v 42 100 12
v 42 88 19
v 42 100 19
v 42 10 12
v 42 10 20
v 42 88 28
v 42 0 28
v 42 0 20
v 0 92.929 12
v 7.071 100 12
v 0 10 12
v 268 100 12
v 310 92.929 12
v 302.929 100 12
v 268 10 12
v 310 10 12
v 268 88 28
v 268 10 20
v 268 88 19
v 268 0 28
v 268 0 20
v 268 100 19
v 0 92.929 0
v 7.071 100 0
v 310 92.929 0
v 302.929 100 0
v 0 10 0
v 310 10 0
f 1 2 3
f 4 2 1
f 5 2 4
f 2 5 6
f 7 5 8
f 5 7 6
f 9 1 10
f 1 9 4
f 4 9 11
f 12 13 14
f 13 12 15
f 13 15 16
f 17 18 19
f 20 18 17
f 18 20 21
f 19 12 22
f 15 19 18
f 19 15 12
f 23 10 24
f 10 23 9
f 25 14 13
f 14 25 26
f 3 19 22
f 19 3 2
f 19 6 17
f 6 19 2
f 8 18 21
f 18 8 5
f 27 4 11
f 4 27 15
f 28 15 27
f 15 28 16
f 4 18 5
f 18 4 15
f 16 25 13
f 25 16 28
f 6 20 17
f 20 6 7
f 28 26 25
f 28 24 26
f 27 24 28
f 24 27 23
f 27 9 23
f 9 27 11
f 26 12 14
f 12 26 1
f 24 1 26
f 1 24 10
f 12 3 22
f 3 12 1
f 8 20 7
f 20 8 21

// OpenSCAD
include <../src/wardrobe.scad>;
plank_zy_side();
//github_openscad -o wardrobe_3/plank_zy_side.stl -D wardrobe_n=3 -D cutting_edge=0 -D break_view_length=0 wardrobe_3/plank_zy_side_stl.scad
